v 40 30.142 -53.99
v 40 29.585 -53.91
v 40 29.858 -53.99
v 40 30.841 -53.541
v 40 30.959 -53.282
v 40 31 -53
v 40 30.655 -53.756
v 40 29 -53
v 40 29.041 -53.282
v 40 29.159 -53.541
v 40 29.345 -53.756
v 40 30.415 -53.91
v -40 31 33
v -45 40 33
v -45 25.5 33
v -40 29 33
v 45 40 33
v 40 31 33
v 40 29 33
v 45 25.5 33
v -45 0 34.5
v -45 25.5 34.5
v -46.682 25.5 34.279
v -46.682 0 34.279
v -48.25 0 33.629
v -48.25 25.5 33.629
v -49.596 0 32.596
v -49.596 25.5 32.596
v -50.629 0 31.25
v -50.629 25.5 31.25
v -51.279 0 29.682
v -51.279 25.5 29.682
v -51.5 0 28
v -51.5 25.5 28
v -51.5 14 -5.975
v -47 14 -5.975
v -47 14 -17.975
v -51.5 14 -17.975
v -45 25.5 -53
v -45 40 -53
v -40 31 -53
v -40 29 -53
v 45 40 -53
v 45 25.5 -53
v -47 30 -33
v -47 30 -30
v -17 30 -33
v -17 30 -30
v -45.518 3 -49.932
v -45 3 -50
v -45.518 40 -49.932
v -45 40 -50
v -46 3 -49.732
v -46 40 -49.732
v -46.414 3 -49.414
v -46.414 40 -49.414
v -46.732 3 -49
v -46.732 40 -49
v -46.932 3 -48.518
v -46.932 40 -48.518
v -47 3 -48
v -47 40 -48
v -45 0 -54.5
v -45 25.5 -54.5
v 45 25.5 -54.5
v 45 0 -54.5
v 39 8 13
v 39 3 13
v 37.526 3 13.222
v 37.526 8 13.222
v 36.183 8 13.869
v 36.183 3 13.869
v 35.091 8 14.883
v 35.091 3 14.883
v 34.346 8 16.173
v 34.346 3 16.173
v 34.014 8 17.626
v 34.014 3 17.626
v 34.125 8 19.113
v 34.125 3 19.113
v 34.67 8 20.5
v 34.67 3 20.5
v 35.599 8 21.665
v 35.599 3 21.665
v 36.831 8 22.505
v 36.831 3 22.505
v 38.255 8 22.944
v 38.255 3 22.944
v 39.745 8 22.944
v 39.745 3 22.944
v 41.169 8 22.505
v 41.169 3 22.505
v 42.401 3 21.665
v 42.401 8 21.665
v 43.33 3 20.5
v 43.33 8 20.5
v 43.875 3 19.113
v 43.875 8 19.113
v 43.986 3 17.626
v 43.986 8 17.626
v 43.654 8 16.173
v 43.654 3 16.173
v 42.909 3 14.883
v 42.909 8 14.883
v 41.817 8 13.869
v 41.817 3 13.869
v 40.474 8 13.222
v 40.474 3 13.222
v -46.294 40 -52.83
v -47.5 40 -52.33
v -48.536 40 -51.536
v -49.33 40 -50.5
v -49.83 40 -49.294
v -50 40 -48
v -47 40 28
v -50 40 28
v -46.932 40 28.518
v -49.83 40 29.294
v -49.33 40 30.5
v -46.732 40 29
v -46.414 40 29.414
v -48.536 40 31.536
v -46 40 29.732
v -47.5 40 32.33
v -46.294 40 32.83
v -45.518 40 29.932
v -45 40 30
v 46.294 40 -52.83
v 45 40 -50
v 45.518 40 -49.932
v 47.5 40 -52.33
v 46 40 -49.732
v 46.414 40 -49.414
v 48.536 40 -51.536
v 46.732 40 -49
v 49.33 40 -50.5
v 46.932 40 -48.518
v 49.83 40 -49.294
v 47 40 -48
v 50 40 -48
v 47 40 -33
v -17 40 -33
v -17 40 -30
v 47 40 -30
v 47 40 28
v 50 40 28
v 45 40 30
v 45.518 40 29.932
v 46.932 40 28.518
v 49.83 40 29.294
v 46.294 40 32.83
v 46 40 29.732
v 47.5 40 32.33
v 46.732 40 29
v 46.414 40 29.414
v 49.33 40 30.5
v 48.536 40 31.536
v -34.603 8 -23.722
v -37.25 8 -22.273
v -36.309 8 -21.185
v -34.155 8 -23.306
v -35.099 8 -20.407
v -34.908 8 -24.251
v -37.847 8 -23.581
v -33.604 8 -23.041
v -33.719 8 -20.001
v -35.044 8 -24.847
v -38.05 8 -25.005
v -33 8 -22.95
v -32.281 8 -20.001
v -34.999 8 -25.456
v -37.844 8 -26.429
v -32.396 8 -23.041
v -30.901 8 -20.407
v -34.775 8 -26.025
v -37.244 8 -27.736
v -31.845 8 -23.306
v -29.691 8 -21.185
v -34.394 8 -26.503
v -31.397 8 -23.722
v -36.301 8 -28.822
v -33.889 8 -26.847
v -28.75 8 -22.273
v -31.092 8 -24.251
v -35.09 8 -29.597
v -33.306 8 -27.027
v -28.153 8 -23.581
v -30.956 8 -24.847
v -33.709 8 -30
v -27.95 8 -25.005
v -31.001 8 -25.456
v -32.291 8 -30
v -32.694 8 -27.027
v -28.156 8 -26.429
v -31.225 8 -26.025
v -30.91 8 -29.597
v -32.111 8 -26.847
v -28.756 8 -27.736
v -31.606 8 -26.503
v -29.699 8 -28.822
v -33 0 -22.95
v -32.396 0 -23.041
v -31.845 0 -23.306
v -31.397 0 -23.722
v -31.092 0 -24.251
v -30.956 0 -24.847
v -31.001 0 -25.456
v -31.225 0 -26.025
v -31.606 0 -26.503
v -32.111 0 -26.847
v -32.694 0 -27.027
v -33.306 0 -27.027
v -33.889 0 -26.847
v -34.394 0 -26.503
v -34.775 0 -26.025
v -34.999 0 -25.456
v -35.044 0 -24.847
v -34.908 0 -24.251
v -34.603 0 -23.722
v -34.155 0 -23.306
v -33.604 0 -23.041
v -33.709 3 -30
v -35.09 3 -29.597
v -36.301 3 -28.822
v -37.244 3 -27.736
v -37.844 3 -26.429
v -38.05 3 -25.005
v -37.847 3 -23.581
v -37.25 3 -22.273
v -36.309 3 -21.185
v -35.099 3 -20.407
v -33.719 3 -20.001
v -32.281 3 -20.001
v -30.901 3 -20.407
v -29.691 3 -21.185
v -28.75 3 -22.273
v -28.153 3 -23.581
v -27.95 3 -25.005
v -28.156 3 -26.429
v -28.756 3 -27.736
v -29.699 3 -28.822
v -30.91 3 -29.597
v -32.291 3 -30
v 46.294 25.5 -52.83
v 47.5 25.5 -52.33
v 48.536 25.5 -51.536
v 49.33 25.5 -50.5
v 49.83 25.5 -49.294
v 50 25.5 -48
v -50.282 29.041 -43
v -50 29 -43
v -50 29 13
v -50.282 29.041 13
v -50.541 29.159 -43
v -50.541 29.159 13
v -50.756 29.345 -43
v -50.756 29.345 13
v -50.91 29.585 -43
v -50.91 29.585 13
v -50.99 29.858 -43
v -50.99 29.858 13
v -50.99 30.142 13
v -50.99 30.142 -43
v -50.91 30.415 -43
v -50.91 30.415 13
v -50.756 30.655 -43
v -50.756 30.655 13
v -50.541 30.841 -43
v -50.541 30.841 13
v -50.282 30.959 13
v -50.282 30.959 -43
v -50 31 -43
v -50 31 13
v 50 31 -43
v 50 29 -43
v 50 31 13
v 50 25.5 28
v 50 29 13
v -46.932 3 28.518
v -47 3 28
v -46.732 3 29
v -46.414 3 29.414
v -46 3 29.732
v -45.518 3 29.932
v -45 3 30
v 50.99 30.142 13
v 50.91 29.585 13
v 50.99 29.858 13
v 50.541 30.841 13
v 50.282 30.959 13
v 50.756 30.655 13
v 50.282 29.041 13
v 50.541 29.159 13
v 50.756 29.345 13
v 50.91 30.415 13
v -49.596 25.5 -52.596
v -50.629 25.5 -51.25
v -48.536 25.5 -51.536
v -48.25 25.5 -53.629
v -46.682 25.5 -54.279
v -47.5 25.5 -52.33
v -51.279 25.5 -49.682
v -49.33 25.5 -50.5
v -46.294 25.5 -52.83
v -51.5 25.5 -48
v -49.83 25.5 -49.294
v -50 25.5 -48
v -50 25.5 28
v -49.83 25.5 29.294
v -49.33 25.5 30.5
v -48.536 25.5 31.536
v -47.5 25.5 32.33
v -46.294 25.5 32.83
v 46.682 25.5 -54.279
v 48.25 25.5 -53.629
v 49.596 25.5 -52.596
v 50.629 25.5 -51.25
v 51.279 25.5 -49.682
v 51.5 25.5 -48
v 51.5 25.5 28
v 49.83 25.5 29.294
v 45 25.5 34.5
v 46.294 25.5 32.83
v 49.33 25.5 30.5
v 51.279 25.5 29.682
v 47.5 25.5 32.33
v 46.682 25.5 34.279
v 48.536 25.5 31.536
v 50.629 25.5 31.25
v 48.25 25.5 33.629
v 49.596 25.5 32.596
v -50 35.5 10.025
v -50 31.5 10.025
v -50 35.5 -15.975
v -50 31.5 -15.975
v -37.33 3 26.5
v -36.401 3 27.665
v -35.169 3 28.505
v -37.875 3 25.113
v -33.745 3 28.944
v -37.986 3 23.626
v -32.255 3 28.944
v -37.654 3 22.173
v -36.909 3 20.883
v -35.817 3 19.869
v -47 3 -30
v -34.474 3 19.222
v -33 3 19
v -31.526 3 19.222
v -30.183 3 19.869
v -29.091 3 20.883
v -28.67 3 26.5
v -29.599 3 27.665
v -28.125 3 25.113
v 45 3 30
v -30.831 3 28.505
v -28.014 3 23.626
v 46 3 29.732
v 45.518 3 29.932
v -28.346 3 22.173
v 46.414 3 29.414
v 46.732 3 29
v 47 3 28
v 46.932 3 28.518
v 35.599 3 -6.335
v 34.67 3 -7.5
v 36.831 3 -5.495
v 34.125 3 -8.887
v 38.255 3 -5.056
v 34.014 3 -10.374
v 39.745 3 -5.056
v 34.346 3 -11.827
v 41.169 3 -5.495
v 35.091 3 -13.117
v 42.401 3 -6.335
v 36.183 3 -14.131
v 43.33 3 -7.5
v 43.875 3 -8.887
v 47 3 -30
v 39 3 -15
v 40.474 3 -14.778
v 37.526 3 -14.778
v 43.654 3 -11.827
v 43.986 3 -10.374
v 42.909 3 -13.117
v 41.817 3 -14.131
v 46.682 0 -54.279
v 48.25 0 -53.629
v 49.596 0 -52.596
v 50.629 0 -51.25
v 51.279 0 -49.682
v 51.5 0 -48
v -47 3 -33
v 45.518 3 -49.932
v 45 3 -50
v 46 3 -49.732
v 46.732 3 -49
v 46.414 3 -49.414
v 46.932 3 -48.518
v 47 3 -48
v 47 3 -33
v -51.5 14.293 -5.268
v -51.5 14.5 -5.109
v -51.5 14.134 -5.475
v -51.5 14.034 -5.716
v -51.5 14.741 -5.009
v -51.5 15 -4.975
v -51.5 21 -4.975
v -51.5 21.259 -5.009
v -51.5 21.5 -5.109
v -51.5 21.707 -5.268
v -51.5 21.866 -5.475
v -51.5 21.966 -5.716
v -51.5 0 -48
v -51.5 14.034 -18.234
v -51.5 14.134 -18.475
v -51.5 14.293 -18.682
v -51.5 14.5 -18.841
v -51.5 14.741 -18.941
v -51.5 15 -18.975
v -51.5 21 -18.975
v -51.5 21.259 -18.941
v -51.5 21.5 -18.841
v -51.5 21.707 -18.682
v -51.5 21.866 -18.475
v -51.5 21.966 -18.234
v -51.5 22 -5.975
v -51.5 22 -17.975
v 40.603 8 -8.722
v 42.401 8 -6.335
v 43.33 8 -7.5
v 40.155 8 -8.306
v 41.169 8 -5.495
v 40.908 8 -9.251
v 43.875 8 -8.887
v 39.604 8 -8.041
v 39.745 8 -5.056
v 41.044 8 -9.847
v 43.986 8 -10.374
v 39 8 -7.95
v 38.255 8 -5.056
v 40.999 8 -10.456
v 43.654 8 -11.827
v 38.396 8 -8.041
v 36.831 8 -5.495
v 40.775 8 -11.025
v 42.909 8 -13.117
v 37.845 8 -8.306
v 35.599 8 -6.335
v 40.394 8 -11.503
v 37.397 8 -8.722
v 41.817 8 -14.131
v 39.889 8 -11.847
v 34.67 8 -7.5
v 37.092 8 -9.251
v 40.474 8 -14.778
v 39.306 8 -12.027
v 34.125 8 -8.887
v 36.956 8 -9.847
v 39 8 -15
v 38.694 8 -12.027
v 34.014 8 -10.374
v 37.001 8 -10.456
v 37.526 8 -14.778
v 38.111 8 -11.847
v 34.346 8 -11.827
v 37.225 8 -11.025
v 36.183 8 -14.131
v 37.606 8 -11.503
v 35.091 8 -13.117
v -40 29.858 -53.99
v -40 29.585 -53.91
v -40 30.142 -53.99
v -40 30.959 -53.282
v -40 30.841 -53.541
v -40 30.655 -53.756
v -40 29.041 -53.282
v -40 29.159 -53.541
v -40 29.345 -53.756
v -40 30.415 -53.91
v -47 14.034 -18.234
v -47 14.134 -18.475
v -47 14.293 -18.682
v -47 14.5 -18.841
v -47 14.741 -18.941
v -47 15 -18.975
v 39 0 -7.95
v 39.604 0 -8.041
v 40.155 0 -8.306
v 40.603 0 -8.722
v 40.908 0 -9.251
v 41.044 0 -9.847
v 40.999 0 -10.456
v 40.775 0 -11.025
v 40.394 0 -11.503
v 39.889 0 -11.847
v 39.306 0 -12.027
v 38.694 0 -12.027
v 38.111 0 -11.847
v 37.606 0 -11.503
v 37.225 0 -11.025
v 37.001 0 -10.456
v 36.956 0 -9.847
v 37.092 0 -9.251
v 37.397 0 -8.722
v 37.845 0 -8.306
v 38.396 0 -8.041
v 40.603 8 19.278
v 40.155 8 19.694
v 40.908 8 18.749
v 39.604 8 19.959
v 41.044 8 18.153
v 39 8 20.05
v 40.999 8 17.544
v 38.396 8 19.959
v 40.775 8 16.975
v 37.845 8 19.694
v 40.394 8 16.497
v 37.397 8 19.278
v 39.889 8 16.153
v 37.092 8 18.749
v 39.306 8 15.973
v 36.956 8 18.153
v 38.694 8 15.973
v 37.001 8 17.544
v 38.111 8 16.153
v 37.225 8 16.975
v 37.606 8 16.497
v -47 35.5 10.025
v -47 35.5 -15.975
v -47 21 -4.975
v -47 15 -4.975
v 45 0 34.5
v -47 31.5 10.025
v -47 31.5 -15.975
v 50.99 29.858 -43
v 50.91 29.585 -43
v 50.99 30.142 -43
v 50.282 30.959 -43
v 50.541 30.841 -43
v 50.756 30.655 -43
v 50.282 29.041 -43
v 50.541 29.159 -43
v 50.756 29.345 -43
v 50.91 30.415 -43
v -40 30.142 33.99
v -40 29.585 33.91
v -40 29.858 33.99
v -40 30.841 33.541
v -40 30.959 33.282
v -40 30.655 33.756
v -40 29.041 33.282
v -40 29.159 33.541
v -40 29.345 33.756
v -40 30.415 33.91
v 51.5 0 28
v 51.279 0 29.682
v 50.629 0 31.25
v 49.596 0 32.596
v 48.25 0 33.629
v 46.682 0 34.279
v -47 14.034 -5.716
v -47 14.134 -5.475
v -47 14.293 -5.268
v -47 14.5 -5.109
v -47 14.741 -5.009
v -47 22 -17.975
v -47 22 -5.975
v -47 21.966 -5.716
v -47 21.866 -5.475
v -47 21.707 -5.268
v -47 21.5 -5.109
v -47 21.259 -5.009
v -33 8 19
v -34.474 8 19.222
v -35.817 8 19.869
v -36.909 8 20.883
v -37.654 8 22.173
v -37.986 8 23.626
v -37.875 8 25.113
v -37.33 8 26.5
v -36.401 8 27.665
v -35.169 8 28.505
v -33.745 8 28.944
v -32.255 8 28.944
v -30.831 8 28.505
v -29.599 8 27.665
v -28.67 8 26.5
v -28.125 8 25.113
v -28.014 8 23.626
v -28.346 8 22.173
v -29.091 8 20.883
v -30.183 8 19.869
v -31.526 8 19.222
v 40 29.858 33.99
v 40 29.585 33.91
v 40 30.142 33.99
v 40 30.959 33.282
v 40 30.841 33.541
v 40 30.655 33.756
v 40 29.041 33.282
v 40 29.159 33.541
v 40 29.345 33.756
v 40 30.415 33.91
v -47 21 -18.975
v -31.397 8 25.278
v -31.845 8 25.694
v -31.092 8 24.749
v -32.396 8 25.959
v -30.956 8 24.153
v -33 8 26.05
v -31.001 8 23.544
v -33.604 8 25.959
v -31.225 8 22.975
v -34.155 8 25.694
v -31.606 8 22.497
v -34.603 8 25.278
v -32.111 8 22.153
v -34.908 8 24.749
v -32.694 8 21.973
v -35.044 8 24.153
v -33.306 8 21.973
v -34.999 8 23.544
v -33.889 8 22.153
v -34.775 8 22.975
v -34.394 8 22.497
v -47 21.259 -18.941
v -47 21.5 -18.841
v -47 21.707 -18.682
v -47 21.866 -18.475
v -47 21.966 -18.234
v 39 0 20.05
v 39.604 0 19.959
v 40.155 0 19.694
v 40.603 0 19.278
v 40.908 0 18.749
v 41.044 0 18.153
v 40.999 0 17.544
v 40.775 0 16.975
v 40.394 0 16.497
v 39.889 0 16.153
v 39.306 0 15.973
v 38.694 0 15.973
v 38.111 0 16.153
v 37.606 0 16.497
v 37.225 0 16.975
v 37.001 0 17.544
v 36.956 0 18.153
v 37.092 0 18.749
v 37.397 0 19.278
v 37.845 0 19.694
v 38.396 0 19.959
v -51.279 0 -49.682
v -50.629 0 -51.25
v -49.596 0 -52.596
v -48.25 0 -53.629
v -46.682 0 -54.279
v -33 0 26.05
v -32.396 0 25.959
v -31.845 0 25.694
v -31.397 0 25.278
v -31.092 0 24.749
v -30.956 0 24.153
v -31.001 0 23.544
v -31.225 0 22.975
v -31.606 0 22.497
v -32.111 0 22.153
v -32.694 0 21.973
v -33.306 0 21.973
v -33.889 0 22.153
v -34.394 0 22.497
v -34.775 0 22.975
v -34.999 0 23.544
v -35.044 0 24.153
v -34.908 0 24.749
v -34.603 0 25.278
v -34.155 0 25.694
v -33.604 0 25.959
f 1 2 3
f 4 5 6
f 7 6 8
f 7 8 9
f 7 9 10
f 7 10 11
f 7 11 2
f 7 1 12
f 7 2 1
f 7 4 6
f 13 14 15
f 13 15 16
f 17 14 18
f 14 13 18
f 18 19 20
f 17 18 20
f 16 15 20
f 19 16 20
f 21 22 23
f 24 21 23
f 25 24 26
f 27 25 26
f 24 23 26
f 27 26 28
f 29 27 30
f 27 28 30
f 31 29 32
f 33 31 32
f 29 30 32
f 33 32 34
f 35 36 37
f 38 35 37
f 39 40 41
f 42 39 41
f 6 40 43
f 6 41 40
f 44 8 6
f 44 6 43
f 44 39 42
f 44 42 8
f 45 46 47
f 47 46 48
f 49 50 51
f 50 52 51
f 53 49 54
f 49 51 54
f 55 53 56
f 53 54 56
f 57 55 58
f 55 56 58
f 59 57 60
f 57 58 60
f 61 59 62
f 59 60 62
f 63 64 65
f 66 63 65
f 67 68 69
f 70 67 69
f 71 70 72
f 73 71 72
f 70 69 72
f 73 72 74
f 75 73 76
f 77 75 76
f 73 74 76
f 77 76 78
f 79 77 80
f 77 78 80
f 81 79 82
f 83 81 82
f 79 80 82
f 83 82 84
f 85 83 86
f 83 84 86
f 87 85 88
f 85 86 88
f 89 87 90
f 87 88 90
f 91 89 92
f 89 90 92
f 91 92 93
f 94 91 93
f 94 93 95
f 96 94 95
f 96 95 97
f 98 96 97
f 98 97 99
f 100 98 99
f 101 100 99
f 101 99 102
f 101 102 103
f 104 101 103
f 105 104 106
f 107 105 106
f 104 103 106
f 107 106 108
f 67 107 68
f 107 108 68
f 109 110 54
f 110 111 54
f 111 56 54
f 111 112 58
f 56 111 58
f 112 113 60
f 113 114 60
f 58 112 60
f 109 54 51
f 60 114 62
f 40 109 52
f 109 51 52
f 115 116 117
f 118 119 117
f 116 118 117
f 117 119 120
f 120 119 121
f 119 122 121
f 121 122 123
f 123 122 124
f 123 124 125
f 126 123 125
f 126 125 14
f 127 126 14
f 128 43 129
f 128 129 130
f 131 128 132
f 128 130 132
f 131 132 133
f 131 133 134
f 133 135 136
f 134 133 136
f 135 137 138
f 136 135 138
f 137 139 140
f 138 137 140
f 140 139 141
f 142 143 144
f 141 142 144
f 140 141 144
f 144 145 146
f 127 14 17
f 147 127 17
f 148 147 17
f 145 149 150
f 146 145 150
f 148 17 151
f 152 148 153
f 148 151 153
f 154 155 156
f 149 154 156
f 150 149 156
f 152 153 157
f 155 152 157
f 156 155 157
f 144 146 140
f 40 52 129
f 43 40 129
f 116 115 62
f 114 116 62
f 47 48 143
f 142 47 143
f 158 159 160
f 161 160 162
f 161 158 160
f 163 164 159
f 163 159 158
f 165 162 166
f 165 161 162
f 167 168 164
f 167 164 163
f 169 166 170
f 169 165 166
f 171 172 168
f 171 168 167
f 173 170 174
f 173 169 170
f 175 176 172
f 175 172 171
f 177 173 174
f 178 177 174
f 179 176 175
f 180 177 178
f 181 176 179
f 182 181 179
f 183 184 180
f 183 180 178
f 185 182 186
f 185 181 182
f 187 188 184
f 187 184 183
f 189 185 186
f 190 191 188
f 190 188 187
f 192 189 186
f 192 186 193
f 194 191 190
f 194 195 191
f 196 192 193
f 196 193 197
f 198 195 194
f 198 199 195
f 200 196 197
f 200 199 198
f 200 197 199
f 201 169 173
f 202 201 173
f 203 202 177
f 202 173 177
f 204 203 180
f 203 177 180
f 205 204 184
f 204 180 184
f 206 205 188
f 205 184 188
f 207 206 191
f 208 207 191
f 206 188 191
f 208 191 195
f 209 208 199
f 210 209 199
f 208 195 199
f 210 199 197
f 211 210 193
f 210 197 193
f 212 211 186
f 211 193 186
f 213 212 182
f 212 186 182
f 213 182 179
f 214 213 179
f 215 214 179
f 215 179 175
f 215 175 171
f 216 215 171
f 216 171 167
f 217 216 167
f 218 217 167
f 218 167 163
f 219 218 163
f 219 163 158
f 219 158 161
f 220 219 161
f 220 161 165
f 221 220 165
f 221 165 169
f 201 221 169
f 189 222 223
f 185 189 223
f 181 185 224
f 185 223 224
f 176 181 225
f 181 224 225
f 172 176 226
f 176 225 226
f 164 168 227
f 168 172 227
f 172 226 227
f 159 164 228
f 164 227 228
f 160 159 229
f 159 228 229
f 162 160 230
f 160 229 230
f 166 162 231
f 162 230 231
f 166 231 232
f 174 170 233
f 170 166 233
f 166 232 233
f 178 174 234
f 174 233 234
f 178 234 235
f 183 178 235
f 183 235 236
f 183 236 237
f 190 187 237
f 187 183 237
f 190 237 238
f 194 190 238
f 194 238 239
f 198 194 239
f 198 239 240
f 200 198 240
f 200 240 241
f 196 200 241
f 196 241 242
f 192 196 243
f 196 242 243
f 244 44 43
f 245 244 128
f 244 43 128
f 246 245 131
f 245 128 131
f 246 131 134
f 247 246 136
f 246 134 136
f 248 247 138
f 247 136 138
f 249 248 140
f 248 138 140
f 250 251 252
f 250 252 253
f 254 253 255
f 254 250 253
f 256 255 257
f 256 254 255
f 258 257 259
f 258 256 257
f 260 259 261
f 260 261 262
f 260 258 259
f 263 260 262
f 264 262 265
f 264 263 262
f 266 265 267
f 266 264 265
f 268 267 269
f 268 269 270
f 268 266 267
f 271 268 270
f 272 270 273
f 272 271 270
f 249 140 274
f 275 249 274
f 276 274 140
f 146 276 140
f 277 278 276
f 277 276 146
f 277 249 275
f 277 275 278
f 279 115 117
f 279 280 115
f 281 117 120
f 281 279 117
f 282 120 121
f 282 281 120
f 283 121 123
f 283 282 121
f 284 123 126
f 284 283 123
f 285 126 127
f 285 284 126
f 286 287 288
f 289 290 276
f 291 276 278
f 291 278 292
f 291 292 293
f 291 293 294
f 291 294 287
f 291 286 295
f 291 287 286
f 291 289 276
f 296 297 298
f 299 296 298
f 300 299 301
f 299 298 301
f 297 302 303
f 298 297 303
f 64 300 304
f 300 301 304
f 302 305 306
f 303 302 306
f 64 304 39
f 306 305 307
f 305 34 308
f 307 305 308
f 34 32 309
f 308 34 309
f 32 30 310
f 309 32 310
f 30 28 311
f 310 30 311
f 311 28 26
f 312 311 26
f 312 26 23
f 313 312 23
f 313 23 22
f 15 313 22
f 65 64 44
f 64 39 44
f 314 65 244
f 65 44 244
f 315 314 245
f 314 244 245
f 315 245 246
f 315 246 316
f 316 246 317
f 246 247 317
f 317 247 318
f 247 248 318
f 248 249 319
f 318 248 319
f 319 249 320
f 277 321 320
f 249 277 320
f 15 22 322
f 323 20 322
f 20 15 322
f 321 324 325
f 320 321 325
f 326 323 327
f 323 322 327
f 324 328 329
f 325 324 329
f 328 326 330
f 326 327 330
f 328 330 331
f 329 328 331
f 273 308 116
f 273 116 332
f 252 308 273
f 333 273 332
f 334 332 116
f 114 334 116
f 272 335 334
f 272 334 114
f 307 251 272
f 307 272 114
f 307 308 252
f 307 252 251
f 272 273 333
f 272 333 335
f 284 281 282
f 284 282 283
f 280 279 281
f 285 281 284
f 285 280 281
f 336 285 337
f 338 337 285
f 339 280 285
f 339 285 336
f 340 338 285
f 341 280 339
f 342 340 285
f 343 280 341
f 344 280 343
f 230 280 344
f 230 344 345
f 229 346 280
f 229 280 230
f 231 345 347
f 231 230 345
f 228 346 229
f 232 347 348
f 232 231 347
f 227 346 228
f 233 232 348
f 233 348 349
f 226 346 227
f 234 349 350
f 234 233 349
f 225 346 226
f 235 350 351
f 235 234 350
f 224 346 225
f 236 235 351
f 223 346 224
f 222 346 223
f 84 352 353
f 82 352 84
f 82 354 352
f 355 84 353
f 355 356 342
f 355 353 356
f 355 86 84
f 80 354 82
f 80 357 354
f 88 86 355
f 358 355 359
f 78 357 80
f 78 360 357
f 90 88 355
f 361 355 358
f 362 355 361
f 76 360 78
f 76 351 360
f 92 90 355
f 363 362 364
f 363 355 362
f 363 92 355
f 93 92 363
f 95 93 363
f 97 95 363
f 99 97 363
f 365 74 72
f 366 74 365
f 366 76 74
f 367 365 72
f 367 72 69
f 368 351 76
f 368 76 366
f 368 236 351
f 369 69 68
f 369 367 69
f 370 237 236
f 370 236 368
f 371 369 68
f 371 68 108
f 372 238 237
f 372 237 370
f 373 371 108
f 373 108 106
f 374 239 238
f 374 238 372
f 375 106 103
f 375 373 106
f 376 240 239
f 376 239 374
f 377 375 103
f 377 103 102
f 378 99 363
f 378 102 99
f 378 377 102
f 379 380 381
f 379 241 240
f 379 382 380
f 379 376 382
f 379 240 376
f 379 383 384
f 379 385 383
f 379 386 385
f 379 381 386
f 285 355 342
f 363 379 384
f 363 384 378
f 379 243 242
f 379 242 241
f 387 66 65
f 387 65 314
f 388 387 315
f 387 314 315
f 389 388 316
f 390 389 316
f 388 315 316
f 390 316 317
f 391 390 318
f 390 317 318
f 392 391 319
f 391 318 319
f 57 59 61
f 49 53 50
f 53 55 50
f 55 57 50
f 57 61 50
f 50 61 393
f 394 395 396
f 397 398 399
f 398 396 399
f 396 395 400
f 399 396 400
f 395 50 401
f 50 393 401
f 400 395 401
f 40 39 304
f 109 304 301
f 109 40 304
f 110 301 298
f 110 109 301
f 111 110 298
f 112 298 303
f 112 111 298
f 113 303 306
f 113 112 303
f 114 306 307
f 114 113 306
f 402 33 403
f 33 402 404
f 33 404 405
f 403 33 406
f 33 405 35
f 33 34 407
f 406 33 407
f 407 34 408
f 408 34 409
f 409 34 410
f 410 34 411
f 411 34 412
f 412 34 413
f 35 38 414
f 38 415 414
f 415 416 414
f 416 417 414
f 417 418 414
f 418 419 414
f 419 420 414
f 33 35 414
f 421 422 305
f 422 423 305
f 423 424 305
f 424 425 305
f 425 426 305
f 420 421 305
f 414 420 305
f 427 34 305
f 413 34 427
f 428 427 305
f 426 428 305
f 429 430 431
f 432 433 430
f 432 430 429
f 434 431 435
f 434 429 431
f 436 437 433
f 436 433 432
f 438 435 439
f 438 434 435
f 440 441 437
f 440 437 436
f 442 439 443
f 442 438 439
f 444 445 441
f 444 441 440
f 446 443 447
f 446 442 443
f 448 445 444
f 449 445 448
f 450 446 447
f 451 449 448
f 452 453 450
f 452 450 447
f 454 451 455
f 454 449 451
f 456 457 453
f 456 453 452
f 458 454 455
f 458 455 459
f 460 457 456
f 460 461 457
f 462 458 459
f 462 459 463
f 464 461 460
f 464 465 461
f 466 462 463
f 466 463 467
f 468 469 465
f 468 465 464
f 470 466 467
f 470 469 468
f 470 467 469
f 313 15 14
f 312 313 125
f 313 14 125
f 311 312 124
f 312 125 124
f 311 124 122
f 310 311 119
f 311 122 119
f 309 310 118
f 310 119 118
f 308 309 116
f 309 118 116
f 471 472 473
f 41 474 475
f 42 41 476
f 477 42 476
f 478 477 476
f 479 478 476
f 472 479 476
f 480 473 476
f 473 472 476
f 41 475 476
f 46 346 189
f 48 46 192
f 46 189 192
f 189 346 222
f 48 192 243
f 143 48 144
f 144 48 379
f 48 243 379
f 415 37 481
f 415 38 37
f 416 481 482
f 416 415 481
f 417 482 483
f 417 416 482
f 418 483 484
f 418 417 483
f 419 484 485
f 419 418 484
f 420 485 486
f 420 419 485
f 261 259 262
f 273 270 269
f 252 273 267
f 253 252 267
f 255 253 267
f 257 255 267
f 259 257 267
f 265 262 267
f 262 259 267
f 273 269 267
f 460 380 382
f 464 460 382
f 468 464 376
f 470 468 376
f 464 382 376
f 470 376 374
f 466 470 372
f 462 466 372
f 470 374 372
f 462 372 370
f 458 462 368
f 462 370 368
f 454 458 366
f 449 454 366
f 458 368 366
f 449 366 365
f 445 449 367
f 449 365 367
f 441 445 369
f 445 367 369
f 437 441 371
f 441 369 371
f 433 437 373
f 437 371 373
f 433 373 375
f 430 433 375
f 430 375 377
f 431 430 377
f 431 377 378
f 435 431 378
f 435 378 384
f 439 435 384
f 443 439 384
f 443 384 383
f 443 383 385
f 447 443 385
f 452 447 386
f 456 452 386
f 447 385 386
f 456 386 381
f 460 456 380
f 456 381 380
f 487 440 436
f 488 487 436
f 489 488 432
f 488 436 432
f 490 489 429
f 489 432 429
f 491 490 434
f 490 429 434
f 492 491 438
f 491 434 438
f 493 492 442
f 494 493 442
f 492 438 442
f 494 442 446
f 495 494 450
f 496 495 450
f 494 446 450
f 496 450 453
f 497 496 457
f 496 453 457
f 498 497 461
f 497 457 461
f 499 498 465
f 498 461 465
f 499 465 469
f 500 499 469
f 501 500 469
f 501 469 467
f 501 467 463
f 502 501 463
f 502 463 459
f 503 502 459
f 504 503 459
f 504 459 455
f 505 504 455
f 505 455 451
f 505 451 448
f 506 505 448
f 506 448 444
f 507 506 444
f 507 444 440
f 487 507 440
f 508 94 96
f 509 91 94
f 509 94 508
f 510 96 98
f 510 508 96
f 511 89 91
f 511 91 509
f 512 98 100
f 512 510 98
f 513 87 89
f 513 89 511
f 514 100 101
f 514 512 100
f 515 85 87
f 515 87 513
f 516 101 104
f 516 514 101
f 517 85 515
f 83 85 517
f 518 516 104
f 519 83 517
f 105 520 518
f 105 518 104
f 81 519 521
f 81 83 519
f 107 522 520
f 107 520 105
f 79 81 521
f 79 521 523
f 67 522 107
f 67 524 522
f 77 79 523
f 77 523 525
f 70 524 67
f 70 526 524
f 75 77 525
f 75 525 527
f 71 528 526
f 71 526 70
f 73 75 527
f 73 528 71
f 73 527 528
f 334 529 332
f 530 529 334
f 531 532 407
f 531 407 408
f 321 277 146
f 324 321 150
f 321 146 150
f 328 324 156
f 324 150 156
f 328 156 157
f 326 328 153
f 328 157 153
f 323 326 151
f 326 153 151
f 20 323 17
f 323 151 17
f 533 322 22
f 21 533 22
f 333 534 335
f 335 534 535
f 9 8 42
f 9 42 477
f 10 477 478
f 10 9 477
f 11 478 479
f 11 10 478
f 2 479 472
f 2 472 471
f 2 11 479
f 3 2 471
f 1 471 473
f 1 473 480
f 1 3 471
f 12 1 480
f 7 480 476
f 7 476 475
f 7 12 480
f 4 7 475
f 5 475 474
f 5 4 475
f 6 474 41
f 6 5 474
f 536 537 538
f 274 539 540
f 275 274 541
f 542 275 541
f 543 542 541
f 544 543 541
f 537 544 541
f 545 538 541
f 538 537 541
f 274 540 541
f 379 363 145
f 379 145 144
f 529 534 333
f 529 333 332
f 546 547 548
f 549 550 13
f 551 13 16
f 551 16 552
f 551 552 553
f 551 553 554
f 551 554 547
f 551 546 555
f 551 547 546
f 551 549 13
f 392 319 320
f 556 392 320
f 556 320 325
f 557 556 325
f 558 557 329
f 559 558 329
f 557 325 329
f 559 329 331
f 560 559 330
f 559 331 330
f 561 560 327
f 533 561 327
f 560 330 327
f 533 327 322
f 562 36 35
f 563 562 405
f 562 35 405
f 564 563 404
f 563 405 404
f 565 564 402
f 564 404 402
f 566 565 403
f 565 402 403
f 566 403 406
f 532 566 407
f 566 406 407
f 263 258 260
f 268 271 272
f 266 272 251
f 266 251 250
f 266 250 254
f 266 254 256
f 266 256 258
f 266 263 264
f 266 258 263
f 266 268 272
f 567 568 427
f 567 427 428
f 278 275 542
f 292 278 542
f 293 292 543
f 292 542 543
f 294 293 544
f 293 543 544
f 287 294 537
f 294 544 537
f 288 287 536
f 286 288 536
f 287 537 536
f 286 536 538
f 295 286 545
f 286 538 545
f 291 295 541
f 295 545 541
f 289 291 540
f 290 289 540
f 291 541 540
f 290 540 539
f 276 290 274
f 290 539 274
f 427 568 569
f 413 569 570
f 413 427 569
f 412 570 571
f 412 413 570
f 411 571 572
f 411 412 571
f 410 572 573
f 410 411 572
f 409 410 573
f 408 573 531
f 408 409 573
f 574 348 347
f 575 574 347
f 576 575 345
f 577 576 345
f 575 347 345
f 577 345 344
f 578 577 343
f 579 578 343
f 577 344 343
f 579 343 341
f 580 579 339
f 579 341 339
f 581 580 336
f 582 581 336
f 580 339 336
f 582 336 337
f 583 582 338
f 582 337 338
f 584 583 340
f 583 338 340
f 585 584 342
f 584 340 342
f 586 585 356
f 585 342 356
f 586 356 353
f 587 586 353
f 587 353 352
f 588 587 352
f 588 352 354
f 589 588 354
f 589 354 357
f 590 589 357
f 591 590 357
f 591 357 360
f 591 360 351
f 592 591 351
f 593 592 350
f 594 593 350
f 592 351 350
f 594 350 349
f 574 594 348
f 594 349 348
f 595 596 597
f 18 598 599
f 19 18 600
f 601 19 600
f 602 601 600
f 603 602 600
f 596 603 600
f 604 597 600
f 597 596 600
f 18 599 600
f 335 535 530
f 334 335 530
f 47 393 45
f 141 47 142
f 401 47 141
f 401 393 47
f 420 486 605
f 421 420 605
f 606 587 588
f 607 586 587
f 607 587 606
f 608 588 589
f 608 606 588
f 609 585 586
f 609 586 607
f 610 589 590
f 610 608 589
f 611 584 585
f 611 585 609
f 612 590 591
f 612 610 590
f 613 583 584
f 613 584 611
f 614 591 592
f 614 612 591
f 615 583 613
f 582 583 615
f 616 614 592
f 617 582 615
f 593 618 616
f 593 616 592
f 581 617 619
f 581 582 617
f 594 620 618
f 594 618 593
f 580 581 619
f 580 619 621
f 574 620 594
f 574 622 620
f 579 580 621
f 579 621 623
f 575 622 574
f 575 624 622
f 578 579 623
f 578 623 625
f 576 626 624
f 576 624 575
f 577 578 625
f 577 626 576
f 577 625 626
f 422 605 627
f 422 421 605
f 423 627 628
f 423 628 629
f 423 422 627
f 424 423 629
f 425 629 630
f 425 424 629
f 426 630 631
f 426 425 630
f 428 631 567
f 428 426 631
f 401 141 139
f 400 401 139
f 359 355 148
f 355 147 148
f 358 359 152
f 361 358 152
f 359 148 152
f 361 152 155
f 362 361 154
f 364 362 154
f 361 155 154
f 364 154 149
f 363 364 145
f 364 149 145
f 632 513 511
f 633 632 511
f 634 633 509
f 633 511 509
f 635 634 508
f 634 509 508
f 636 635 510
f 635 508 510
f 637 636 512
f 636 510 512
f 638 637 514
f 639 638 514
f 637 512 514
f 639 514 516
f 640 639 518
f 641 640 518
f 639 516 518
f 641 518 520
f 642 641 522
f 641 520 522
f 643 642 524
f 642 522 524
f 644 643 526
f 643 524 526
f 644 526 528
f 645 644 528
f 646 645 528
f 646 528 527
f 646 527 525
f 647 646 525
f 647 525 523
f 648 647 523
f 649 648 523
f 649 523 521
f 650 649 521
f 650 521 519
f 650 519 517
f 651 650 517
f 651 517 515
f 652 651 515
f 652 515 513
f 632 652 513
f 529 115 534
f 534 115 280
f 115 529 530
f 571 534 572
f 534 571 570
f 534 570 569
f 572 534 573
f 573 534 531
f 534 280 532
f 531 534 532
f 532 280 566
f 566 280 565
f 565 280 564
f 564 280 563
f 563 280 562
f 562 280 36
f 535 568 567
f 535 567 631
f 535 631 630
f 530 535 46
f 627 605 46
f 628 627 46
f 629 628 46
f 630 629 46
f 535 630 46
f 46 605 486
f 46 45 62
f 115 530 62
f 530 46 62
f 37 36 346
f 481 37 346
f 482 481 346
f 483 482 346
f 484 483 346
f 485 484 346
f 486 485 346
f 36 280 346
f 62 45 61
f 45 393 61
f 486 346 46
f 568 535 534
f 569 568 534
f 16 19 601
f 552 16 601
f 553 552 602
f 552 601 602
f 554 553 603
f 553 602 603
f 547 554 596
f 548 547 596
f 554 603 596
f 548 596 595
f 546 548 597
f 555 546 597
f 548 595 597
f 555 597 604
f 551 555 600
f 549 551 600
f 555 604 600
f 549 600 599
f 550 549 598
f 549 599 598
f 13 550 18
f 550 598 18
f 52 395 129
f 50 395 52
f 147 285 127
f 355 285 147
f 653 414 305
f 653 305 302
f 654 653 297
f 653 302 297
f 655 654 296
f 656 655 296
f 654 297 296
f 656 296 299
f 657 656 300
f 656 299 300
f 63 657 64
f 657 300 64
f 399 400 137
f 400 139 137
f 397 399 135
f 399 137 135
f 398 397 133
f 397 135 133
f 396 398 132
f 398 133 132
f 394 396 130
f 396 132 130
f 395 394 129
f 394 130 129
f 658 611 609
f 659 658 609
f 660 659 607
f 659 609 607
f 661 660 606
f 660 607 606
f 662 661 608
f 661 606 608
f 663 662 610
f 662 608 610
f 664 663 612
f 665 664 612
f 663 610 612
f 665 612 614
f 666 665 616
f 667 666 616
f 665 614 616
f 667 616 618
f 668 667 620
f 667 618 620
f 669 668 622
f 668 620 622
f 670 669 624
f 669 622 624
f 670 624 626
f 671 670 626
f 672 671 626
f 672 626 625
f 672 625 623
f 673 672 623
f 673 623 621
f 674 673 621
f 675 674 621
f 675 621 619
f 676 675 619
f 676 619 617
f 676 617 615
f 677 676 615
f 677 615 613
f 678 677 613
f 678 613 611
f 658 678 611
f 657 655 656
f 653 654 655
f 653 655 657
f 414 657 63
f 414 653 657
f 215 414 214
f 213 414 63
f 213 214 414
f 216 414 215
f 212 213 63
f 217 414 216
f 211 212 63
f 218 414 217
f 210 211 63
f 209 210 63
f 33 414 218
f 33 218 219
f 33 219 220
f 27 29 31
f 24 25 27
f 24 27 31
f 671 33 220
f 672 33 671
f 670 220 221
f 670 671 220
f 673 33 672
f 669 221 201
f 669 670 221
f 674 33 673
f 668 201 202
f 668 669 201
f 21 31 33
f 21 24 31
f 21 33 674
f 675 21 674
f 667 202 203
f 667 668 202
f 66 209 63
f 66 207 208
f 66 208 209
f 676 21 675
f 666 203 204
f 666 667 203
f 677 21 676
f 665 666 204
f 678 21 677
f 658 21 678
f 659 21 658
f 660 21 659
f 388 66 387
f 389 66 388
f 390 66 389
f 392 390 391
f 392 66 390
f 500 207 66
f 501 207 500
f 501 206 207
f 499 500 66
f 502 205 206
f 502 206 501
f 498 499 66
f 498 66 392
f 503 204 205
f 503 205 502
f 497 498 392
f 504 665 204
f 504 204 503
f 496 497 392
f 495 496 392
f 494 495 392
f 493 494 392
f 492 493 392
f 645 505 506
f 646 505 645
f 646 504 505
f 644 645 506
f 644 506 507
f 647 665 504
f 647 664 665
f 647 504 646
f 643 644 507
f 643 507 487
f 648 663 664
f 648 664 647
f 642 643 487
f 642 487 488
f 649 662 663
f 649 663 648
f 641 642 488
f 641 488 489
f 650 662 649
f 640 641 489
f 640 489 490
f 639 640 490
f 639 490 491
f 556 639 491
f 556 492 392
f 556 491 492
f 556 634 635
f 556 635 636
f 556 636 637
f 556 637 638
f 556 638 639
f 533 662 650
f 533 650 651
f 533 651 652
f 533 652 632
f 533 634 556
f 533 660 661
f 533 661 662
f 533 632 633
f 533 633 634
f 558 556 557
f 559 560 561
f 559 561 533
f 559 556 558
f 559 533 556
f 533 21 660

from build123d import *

# Parameters (mm, degrees)
ESQUISSE1_W             = 100
ESQUISSE1_H             = 66
BOSS_EXTRU_1_DEPTH      = 40
COQUE1_T                = -3
BOSS_EXTRU_2_DEPTH      = 40
ESQUISSE3_W             = 94
ESQUISSE3_H             = 17
BOSS_EXTRU_3_DEPTH      = 3
CONG_1_R                = 2
CONG_2_R                = 5
BOSS_EXTRU_4_START      = -10
BOSS_EXTRU_4_DEPTH      = 80
BOSS_EXTRU_5_START      = -10
BOSS_EXTRU_5_DEPTH      = 56
ESQUISSE6_W             = 30
ESQUISSE6_H             = 10
ENL_V_MAT_EXTRU_1_DEPTH = 5
ESQUISSE7_R             = 5.05
ESQUISSE7_R_2           = 5
BOSS_EXTRU_6_DEPTH      = 5
ESQUISSE8_R             = 2.05
ENL_V_MAT_EXTRU_2_DEPTH = 81.876448982
BOSS_EXTRU_7_START      = -25.5
BOSS_EXTRU_7_DEPTH      = 25.5
ESQUISSE11_W            = 14
ESQUISSE11_H            = 8
ENL_V_MAT_EXTRU_4_DEPTH = 10
CONG_3_R                = 1
ESQUISSE12_W            = 26
ESQUISSE12_H            = 4
ENL_V_MAT_EXTRU_5_DEPTH = 10


with BuildPart() as part:
    # Esquisse1 → Boss.-Extru.1 (new body)
    with BuildSketch(Plane(origin=(0, 0, 0), x_dir=(1, 0, 0), z_dir=(0, 1, 0))):
        Rectangle(ESQUISSE1_W, ESQUISSE1_H)
    extrude(amount=BOSS_EXTRU_1_DEPTH)

    # Coque1
    coque1_openings = [part.faces().sort_by_distance(p)[0] for p in [
        (0, 40, 0),
    ]]
    offset(amount=COQUE1_T, openings=coque1_openings, kind=Kind.INTERSECTION)

    # Esquisse2 → Boss.-Extru.2 (add)
    with BuildSketch(Plane.XZ):
        Polygon((-50, -33), (-50, -53), (50, -53), (50, -33), (47, -33), (47, -50), (-47, -50), (-47, -33), align=None)
    extrude(amount=-BOSS_EXTRU_2_DEPTH)

    # Esquisse3 → Boss.-Extru.3 (add)
    with BuildSketch(Plane.XZ):
        with Locations((0, -41.5)):
            Rectangle(ESQUISSE3_W, ESQUISSE3_H)
    extrude(amount=-BOSS_EXTRU_3_DEPTH)

    # Congé1
    cong_1_edges = [part.edges().sort_by_distance(p)[0] for p in [
        (47, 21.5, 30),
        (-47, 21.5, 30),
        (-47, 21.5, -50),
        (47, 21.5, -50),
    ]]
    fillet(cong_1_edges, radius=CONG_1_R)

    # Congé2
    cong_2_edges = [part.edges().sort_by_distance(p)[0] for p in [
        (50, 20, -53),
        (-50, 20, -53),
        (50, 20, 33),
        (-50, 20, 33),
    ]]
    fillet(cong_2_edges, radius=CONG_2_R)

    # Esquisse4 → Boss.-Extru.4 (add)
    with BuildSketch(Plane(origin=(50, 0, 0), x_dir=(0, 0, -1), z_dir=(1, 0, 0)).offset(BOSS_EXTRU_4_START)):
        with BuildLine():
            Line((-33, 31), (-33, 29))
            ThreePointArc((-33, 29), (-34, 30), (-33, 31))
        make_face()
    boss_extru_4 = extrude(amount=-BOSS_EXTRU_4_DEPTH)

    # Symétrie1: Boss.-Extru.4 across plane
    add(boss_extru_4.mirror(Plane(origin=(0, 0, -10), x_dir=(1, 0, 0), z_dir=(0, 0, -1))))

    # Esquisse5 → Boss.-Extru.5 (add)
    with BuildSketch(Plane(origin=(0, 0, -53), x_dir=(-1, 0, 0), z_dir=(0, 0, -1)).offset(BOSS_EXTRU_5_START)):
        with BuildLine():
            Line((50, 31), (50, 29))
            ThreePointArc((50, 29), (51, 30), (50, 31))
        make_face()
    boss_extru_5 = extrude(amount=-BOSS_EXTRU_5_DEPTH)

    # Symétrie2: Boss.-Extru.5 across plane
    add(boss_extru_5.mirror(Plane(origin=(0, 0, 0), x_dir=(0, 0, 1), z_dir=(1, 0, 0))))

    # Esquisse6 → Enlèv. mat.-Extru.1 (cut)
    with BuildSketch(Plane.XY.offset(-30)):
        with Locations((-32, 35)):
            Rectangle(ESQUISSE6_W, ESQUISSE6_H)
    extrude(amount=-ENL_V_MAT_EXTRU_1_DEPTH, mode=Mode.SUBTRACT)

    # Esquisse7 → Boss.-Extru.6 (add)
    with BuildSketch(Plane(origin=(0, 3, 0), x_dir=(1, 0, 0), z_dir=(0, 1, 0))):
        with Locations((-33, 25)):
            Circle(ESQUISSE7_R)
        with Locations(Location((-33, -24, 0), (0, 0, 90))):
            Circle(ESQUISSE7_R_2)
        with Locations(Location((39, -18, 0), (0, 0, 90))):
            Circle(ESQUISSE7_R_2)
        with Locations(Location((39, 10, 0), (0, 0, 90))):
            Circle(ESQUISSE7_R_2)
    extrude(amount=BOSS_EXTRU_6_DEPTH)

    # Esquisse8 → Enlèv. mat.-Extru.2 (cut, through all)
    with BuildSketch(Plane(origin=(0, 8, 0), x_dir=(1, 0, 0), z_dir=(0, 1, 0))):
        with Locations(Location((-33, 25, 0), (0, 0, 270))):
            Circle(ESQUISSE8_R)
        with Locations(Location((-33, -24, 0), (0, 0, 270))):
            Circle(ESQUISSE8_R)
        with Locations(Location((39, 10, 0), (0, 0, 270))):
            Circle(ESQUISSE8_R)
        with Locations(Location((39, -18, 0), (0, 0, 270))):
            Circle(ESQUISSE8_R)
    extrude(amount=-ENL_V_MAT_EXTRU_2_DEPTH, mode=Mode.SUBTRACT)

    # Esquisse10 → Boss.-Extru.7 (add)
    with BuildSketch(Plane.XZ.offset(BOSS_EXTRU_7_START)):
        with BuildLine():
            Line((-51.5, 28), (-51.5, -48))
            ThreePointArc((-51.5, -48), (-49.596194078, -52.596194078), (-45, -54.5))
            Line((-45, -54.5), (45, -54.5))
            ThreePointArc((45, -54.5), (49.596194078, -52.596194078), (51.5, -48))
            Line((51.5, -48), (51.5, 28))
            ThreePointArc((51.5, 28), (49.596194078, 32.596194078), (45, 34.5))
            Line((45, 34.5), (-45, 34.5))
            ThreePointArc((-45, 34.5), (-49.596194078, 32.596194078), (-51.5, 28))
        make_face()
        with BuildLine():
            Line((50, 28), (50, -48))
            ThreePointArc((50, -48), (48.535533906, -51.535533906), (45, -53))
            Line((45, -53), (-45, -53))
            ThreePointArc((-45, -53), (-48.535533906, -51.535533906), (-50, -48))
            Line((-50, -48), (-50, 28))
            ThreePointArc((-50, 28), (-48.535533906, 31.535533906), (-45, 33))
            Line((-45, 33), (45, 33))
            ThreePointArc((45, 33), (48.535533906, 31.535533906), (50, 28))
        make_face(mode=Mode.SUBTRACT)
    extrude(amount=BOSS_EXTRU_7_DEPTH)

    # Esquisse11 → Enlèv. mat.-Extru.4 (cut)
    with BuildSketch(Plane(origin=(-47, 0, 0), x_dir=(0, 0, -1), z_dir=(1, 0, 0))):
        with Locations((11.975, 18)):
            Rectangle(ESQUISSE11_W, ESQUISSE11_H)
    extrude(amount=-ENL_V_MAT_EXTRU_4_DEPTH, mode=Mode.SUBTRACT)

    # Congé3
    cong_3_edges = [part.edges().sort_by_distance(p)[0] for p in [
        (-49.25, 22, -18.975),
        (-49.25, 14, -18.975),
        (-49.25, 14, -4.975),
        (-49.25, 22, -4.975),
    ]]
    fillet(cong_3_edges, radius=CONG_3_R)

    # Esquisse12 → Enlèv. mat.-Extru.5 (cut)
    with BuildSketch(Plane(origin=(-47, 0, 0), x_dir=(0, 0, -1), z_dir=(1, 0, 0))):
        with Locations((2.975, 33.5)):
            Rectangle(ESQUISSE12_W, ESQUISSE12_H)
    extrude(amount=-ENL_V_MAT_EXTRU_5_DEPTH, mode=Mode.SUBTRACT)


solid = part.part
